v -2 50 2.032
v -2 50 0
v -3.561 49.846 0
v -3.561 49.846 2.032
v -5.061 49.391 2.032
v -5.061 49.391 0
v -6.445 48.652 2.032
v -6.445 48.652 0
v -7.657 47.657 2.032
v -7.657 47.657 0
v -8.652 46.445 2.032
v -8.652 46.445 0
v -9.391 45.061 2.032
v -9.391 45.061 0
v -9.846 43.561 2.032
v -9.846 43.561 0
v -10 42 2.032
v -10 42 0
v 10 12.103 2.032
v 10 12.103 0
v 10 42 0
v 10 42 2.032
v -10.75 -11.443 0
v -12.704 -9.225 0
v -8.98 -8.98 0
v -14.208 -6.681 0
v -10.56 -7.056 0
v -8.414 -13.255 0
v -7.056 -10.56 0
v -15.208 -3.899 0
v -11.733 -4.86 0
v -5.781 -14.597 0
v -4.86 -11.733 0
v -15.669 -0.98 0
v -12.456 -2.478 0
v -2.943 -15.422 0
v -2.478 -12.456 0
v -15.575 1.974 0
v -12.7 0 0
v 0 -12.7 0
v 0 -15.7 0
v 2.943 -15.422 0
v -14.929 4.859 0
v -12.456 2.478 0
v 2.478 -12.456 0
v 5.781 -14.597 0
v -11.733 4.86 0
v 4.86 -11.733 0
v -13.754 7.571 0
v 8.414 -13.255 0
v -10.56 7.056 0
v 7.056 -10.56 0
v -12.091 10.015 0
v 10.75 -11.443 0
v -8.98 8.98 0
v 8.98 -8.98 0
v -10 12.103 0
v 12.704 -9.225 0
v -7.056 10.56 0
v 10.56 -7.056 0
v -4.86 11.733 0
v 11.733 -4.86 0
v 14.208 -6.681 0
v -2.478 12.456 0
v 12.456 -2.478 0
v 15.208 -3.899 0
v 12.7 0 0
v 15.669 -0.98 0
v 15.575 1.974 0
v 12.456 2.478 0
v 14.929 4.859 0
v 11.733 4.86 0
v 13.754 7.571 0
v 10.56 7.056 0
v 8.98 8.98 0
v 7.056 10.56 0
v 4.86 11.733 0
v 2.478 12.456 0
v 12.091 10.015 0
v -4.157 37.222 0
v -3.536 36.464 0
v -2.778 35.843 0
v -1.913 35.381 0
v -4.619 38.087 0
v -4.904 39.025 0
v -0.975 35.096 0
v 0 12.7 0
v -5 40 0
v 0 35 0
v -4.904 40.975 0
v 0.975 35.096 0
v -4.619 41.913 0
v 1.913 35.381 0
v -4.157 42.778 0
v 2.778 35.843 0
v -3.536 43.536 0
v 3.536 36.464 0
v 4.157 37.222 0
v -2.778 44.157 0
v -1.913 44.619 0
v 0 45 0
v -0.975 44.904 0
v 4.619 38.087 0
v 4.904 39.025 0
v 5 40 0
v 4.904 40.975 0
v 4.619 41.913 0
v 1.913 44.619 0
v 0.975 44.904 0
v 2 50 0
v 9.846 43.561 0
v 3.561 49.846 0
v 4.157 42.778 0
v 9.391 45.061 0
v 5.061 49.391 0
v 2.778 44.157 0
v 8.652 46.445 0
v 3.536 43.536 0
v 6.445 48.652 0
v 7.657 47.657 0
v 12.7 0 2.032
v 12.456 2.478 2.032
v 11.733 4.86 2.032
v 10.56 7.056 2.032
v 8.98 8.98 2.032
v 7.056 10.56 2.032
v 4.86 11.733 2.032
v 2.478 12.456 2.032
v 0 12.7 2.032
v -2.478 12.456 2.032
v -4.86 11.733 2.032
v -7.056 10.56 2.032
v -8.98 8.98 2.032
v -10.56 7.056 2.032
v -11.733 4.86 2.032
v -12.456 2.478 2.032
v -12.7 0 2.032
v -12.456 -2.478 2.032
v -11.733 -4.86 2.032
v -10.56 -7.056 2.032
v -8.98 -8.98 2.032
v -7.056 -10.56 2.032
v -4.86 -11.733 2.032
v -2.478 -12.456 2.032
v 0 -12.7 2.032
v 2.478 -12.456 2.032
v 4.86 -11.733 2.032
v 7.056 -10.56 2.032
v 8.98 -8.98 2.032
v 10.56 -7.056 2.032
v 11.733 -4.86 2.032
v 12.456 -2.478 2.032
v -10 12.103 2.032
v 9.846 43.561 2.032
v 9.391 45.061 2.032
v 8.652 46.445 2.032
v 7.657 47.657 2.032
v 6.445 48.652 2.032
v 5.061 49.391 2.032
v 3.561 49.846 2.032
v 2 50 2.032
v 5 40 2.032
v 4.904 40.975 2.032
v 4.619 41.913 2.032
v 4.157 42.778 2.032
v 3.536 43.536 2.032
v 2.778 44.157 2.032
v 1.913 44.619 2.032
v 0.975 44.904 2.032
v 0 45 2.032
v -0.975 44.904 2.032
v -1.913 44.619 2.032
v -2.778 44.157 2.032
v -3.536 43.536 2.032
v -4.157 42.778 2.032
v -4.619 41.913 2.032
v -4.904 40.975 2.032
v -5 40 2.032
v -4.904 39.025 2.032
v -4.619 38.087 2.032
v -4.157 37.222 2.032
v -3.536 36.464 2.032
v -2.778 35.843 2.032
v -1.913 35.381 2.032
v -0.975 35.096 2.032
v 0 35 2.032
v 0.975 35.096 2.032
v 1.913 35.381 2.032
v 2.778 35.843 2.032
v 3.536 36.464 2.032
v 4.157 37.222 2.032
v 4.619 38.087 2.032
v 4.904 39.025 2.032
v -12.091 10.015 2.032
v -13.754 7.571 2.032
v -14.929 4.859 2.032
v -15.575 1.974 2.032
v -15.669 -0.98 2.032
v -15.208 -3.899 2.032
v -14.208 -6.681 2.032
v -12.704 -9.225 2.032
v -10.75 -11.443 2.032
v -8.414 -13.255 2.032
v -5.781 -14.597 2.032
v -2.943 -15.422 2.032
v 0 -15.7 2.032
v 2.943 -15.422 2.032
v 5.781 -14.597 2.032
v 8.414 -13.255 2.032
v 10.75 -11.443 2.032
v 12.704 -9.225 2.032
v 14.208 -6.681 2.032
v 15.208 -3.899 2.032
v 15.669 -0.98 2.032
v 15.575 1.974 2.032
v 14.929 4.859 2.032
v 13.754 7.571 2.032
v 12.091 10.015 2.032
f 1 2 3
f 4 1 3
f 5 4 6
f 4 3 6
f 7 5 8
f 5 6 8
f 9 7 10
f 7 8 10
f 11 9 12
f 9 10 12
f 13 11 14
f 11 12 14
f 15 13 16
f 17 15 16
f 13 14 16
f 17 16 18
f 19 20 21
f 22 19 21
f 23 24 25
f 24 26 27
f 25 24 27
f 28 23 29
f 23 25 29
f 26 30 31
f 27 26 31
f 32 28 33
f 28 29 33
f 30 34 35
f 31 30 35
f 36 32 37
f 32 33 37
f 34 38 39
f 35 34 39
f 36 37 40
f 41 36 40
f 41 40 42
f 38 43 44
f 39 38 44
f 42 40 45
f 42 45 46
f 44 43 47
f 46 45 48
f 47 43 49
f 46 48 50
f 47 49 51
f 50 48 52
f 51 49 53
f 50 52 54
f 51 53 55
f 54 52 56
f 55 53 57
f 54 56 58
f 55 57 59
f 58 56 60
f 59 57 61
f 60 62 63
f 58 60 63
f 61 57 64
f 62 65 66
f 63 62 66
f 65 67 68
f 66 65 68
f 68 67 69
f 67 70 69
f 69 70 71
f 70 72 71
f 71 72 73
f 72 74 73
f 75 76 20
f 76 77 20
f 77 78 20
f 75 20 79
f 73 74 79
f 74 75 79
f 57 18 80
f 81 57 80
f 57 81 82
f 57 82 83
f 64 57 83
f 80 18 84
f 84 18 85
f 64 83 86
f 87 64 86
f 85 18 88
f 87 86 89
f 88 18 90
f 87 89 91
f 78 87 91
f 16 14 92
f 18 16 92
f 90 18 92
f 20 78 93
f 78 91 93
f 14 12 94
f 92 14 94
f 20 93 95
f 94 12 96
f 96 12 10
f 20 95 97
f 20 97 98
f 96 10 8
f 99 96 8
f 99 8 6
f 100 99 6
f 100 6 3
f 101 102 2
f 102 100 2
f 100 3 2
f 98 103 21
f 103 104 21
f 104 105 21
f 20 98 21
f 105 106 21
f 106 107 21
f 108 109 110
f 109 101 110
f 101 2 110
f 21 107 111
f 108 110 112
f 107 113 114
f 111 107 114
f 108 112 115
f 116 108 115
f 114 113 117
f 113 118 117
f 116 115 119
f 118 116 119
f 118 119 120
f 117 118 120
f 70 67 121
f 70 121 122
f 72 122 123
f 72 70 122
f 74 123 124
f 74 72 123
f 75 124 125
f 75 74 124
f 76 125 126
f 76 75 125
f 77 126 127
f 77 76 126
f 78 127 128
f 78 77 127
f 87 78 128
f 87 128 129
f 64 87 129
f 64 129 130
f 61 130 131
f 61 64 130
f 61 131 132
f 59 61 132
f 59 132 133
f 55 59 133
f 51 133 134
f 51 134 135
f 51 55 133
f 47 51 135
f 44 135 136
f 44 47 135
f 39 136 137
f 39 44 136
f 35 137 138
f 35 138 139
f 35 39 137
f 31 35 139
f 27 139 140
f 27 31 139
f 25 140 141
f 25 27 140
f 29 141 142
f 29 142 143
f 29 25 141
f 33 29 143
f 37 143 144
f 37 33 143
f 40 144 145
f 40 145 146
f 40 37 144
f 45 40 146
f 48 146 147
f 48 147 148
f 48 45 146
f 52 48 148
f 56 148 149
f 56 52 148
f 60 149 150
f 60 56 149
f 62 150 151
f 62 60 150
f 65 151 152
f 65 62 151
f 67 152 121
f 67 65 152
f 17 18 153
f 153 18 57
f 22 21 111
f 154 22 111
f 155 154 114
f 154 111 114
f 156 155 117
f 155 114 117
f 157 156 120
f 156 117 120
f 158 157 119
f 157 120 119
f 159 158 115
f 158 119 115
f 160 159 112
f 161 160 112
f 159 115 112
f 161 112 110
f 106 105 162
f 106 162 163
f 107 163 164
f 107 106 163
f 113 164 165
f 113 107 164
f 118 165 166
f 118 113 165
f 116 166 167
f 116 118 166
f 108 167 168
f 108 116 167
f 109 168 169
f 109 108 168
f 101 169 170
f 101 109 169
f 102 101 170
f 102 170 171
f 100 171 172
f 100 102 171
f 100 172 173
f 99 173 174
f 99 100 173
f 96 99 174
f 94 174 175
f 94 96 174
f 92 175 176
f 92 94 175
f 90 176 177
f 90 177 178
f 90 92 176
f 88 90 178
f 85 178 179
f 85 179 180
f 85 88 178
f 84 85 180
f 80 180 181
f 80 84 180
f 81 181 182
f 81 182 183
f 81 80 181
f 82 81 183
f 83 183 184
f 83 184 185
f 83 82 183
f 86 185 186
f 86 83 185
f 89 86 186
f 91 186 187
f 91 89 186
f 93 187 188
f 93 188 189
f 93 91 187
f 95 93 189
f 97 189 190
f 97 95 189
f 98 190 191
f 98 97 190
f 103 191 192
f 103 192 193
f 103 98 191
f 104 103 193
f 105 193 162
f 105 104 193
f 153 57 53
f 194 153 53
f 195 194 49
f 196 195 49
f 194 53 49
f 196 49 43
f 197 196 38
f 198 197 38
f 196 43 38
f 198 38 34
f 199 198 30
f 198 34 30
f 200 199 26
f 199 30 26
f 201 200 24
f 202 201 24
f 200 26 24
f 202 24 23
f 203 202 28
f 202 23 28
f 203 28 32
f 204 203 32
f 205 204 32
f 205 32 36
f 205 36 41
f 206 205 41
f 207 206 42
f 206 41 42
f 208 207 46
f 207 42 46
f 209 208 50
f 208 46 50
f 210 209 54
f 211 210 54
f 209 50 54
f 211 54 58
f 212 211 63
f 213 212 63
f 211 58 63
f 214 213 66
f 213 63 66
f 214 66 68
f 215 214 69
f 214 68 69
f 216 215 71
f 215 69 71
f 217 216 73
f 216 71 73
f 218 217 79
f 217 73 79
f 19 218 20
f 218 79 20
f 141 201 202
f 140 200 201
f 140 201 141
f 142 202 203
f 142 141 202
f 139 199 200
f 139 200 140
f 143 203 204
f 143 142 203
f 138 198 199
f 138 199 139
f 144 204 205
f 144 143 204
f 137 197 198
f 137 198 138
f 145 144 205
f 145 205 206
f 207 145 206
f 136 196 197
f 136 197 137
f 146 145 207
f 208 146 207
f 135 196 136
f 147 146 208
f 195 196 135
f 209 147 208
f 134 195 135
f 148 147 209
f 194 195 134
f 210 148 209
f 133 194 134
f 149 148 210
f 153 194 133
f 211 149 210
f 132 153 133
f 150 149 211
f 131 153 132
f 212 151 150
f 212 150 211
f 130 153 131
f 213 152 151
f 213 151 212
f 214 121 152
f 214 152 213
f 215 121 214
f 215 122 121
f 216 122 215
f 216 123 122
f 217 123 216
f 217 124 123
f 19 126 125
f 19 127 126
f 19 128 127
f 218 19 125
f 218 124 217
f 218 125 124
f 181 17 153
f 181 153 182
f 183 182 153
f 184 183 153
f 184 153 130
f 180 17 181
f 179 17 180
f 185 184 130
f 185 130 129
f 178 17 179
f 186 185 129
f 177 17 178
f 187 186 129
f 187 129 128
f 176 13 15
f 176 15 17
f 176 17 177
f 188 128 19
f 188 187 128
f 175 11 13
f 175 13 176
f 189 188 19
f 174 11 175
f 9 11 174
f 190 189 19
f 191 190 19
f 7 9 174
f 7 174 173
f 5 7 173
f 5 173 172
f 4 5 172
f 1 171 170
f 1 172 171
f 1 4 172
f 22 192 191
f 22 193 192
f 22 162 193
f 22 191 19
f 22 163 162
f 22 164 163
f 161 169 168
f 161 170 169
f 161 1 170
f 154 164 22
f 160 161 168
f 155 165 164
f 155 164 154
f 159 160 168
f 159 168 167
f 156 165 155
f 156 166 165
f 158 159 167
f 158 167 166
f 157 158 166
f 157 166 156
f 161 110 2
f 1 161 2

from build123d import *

# Parameters (mm, degrees)
F0_R     = 12.7
F0_R_2   = 5
F1_DEPTH = 2.032


with BuildPart() as f1:
    # F0 (on Top) → F1 (new body)
    with BuildSketch(Plane.XY):
        with BuildLine():
            Line((2, 50), (-2, 50))
            ThreePointArc((-2, 50), (-7.656854, 47.656854), (-10, 42))
            Line((-10, 42), (-10, 12.103305))
            ThreePointArc((-10, 12.103305), (0, -15.7), (10, 12.103305))
            Line((10, 12.103305), (10, 42))
            ThreePointArc((10, 42), (7.656854, 47.656854), (2, 50))
        make_face()
        Circle(F0_R, mode=Mode.SUBTRACT)
        with Locations((0, 40)):
            Circle(F0_R_2, mode=Mode.SUBTRACT)
    extrude(amount=F1_DEPTH)


solid = f1.part
